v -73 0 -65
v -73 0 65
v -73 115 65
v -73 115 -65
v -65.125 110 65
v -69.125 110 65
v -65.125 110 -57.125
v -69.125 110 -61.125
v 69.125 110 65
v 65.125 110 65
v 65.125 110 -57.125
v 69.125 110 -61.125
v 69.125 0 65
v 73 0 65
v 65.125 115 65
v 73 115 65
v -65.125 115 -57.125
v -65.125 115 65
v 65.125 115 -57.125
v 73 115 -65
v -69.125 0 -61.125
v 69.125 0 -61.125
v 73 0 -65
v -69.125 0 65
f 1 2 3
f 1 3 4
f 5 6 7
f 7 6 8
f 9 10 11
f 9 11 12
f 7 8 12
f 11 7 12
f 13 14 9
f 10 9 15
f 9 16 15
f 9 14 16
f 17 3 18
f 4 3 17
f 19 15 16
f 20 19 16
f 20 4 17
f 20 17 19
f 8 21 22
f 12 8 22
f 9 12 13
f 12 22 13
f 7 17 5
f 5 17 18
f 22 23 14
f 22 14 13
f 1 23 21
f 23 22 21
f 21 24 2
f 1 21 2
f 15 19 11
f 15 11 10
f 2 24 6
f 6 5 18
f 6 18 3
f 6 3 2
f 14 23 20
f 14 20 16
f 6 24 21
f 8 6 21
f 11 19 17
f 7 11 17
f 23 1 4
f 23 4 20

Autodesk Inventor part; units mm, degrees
ref_plane "YZ Plane" through (0, 0, 0) normal (1, 0, 0) x (0, 1, 0)
ref_plane "XZ Plane" through (0, 0, 0) normal (0, 1, 0) x (-1, 0, 0)
ref_plane "XY Plane" through (0, 0, 0) normal (0, 0, 1) x (1, 0, 0)
sketch "Sketch1" plane through (0, 0, 0) normal (0, 1, 0) x (-1, 0, 0)
  line L0 (-73, 65) -> (73, 65)
  line L1 (73, 65) -> (73, -65)
  line L2 (73, -65) -> (-73, -65)
  line L3 (-73, -65) -> (-73, 65)
  line L4 (-73, 65) -> (73, -65) construction
  line L5 (73, 65) -> (-73, -65) construction
  point P0 (0, 0)
  dimension "d0" = 146
  dimension "d1" = 130
extrude "Extrusion1" add sketch "Sketch1" along normal blind 115
sketch "Sketch2" plane through (0, 0, 0) normal (0, -1, 0) x (1, 0, 0)
  line L0 (-69.125, -61.125) -> (69.125, -61.125)
  line L1 (69.125, -61.125) -> (69.125, 61.125)
  line L2 (69.125, 61.125) -> (-69.125, 61.125)
  line L3 (-69.125, 61.125) -> (-69.125, -61.125)
  line L4 (-69.125, -61.125) -> (69.125, 61.125) construction
  line L5 (69.125, -61.125) -> (-69.125, 61.125) construction
  line L6 (-69.125, 61.125) -> (69.125, 61.125)
  line L7 (69.125, 61.125) -> (69.125, 91.125)
  line L8 (69.125, 91.125) -> (-69.125, 91.125)
  line L9 (-69.125, 91.125) -> (-69.125, 61.125)
  point P0 (0, 0)
  dimension "d4" = 138.25
  dimension "d5" = 122.25
  dimension "d6" = 138.25
  dimension "d7" = 30
extrude "Extrusion2" cut sketch "Sketch2" against normal through all
sketch "Sketch3" plane through (0, 115, 0) normal (0, 1, 0) x (1, 0, 0)
  line L0 (-69.125, 61.125) -> (69.125, 61.125) projected
  line L1 (69.125, 61.125) -> (69.125, -65) projected
  line L2 (-69.125, 61.125) -> (69.125, 61.125)
  line L3 (69.125, 61.125) -> (69.125, -65)
  line L4 (69.125, -65) -> (-69.125, -65)
  line L5 (-69.125, -65) -> (-69.125, 61.125)
  line L6 (-65.125, -57.125) -> (65.125, -57.125)
  line L7 (65.125, -57.125) -> (65.125, 57.125)
  line L8 (65.125, 57.125) -> (-65.125, 57.125)
  line L9 (-65.125, 57.125) -> (-65.125, -57.125)
  line L10 (-65.125, -57.125) -> (65.125, 57.125) construction
  line L11 (65.125, -57.125) -> (-65.125, 57.125) construction
  line L12 (65.125, -57.125) -> (65.125, -65)
  line L13 (-65.125, -57.125) -> (-65.125, -65)
  point P0 (0, 0)
  dimension "d10" = 4
  dimension "d11" = 4
extrude "Extrusion3" add sketch "Sketch3" against normal blind 5 contours L0 L1 L4 L12 L7 L8 L9 L13 L5
properties part number "Cylinder Galvo Housing"
